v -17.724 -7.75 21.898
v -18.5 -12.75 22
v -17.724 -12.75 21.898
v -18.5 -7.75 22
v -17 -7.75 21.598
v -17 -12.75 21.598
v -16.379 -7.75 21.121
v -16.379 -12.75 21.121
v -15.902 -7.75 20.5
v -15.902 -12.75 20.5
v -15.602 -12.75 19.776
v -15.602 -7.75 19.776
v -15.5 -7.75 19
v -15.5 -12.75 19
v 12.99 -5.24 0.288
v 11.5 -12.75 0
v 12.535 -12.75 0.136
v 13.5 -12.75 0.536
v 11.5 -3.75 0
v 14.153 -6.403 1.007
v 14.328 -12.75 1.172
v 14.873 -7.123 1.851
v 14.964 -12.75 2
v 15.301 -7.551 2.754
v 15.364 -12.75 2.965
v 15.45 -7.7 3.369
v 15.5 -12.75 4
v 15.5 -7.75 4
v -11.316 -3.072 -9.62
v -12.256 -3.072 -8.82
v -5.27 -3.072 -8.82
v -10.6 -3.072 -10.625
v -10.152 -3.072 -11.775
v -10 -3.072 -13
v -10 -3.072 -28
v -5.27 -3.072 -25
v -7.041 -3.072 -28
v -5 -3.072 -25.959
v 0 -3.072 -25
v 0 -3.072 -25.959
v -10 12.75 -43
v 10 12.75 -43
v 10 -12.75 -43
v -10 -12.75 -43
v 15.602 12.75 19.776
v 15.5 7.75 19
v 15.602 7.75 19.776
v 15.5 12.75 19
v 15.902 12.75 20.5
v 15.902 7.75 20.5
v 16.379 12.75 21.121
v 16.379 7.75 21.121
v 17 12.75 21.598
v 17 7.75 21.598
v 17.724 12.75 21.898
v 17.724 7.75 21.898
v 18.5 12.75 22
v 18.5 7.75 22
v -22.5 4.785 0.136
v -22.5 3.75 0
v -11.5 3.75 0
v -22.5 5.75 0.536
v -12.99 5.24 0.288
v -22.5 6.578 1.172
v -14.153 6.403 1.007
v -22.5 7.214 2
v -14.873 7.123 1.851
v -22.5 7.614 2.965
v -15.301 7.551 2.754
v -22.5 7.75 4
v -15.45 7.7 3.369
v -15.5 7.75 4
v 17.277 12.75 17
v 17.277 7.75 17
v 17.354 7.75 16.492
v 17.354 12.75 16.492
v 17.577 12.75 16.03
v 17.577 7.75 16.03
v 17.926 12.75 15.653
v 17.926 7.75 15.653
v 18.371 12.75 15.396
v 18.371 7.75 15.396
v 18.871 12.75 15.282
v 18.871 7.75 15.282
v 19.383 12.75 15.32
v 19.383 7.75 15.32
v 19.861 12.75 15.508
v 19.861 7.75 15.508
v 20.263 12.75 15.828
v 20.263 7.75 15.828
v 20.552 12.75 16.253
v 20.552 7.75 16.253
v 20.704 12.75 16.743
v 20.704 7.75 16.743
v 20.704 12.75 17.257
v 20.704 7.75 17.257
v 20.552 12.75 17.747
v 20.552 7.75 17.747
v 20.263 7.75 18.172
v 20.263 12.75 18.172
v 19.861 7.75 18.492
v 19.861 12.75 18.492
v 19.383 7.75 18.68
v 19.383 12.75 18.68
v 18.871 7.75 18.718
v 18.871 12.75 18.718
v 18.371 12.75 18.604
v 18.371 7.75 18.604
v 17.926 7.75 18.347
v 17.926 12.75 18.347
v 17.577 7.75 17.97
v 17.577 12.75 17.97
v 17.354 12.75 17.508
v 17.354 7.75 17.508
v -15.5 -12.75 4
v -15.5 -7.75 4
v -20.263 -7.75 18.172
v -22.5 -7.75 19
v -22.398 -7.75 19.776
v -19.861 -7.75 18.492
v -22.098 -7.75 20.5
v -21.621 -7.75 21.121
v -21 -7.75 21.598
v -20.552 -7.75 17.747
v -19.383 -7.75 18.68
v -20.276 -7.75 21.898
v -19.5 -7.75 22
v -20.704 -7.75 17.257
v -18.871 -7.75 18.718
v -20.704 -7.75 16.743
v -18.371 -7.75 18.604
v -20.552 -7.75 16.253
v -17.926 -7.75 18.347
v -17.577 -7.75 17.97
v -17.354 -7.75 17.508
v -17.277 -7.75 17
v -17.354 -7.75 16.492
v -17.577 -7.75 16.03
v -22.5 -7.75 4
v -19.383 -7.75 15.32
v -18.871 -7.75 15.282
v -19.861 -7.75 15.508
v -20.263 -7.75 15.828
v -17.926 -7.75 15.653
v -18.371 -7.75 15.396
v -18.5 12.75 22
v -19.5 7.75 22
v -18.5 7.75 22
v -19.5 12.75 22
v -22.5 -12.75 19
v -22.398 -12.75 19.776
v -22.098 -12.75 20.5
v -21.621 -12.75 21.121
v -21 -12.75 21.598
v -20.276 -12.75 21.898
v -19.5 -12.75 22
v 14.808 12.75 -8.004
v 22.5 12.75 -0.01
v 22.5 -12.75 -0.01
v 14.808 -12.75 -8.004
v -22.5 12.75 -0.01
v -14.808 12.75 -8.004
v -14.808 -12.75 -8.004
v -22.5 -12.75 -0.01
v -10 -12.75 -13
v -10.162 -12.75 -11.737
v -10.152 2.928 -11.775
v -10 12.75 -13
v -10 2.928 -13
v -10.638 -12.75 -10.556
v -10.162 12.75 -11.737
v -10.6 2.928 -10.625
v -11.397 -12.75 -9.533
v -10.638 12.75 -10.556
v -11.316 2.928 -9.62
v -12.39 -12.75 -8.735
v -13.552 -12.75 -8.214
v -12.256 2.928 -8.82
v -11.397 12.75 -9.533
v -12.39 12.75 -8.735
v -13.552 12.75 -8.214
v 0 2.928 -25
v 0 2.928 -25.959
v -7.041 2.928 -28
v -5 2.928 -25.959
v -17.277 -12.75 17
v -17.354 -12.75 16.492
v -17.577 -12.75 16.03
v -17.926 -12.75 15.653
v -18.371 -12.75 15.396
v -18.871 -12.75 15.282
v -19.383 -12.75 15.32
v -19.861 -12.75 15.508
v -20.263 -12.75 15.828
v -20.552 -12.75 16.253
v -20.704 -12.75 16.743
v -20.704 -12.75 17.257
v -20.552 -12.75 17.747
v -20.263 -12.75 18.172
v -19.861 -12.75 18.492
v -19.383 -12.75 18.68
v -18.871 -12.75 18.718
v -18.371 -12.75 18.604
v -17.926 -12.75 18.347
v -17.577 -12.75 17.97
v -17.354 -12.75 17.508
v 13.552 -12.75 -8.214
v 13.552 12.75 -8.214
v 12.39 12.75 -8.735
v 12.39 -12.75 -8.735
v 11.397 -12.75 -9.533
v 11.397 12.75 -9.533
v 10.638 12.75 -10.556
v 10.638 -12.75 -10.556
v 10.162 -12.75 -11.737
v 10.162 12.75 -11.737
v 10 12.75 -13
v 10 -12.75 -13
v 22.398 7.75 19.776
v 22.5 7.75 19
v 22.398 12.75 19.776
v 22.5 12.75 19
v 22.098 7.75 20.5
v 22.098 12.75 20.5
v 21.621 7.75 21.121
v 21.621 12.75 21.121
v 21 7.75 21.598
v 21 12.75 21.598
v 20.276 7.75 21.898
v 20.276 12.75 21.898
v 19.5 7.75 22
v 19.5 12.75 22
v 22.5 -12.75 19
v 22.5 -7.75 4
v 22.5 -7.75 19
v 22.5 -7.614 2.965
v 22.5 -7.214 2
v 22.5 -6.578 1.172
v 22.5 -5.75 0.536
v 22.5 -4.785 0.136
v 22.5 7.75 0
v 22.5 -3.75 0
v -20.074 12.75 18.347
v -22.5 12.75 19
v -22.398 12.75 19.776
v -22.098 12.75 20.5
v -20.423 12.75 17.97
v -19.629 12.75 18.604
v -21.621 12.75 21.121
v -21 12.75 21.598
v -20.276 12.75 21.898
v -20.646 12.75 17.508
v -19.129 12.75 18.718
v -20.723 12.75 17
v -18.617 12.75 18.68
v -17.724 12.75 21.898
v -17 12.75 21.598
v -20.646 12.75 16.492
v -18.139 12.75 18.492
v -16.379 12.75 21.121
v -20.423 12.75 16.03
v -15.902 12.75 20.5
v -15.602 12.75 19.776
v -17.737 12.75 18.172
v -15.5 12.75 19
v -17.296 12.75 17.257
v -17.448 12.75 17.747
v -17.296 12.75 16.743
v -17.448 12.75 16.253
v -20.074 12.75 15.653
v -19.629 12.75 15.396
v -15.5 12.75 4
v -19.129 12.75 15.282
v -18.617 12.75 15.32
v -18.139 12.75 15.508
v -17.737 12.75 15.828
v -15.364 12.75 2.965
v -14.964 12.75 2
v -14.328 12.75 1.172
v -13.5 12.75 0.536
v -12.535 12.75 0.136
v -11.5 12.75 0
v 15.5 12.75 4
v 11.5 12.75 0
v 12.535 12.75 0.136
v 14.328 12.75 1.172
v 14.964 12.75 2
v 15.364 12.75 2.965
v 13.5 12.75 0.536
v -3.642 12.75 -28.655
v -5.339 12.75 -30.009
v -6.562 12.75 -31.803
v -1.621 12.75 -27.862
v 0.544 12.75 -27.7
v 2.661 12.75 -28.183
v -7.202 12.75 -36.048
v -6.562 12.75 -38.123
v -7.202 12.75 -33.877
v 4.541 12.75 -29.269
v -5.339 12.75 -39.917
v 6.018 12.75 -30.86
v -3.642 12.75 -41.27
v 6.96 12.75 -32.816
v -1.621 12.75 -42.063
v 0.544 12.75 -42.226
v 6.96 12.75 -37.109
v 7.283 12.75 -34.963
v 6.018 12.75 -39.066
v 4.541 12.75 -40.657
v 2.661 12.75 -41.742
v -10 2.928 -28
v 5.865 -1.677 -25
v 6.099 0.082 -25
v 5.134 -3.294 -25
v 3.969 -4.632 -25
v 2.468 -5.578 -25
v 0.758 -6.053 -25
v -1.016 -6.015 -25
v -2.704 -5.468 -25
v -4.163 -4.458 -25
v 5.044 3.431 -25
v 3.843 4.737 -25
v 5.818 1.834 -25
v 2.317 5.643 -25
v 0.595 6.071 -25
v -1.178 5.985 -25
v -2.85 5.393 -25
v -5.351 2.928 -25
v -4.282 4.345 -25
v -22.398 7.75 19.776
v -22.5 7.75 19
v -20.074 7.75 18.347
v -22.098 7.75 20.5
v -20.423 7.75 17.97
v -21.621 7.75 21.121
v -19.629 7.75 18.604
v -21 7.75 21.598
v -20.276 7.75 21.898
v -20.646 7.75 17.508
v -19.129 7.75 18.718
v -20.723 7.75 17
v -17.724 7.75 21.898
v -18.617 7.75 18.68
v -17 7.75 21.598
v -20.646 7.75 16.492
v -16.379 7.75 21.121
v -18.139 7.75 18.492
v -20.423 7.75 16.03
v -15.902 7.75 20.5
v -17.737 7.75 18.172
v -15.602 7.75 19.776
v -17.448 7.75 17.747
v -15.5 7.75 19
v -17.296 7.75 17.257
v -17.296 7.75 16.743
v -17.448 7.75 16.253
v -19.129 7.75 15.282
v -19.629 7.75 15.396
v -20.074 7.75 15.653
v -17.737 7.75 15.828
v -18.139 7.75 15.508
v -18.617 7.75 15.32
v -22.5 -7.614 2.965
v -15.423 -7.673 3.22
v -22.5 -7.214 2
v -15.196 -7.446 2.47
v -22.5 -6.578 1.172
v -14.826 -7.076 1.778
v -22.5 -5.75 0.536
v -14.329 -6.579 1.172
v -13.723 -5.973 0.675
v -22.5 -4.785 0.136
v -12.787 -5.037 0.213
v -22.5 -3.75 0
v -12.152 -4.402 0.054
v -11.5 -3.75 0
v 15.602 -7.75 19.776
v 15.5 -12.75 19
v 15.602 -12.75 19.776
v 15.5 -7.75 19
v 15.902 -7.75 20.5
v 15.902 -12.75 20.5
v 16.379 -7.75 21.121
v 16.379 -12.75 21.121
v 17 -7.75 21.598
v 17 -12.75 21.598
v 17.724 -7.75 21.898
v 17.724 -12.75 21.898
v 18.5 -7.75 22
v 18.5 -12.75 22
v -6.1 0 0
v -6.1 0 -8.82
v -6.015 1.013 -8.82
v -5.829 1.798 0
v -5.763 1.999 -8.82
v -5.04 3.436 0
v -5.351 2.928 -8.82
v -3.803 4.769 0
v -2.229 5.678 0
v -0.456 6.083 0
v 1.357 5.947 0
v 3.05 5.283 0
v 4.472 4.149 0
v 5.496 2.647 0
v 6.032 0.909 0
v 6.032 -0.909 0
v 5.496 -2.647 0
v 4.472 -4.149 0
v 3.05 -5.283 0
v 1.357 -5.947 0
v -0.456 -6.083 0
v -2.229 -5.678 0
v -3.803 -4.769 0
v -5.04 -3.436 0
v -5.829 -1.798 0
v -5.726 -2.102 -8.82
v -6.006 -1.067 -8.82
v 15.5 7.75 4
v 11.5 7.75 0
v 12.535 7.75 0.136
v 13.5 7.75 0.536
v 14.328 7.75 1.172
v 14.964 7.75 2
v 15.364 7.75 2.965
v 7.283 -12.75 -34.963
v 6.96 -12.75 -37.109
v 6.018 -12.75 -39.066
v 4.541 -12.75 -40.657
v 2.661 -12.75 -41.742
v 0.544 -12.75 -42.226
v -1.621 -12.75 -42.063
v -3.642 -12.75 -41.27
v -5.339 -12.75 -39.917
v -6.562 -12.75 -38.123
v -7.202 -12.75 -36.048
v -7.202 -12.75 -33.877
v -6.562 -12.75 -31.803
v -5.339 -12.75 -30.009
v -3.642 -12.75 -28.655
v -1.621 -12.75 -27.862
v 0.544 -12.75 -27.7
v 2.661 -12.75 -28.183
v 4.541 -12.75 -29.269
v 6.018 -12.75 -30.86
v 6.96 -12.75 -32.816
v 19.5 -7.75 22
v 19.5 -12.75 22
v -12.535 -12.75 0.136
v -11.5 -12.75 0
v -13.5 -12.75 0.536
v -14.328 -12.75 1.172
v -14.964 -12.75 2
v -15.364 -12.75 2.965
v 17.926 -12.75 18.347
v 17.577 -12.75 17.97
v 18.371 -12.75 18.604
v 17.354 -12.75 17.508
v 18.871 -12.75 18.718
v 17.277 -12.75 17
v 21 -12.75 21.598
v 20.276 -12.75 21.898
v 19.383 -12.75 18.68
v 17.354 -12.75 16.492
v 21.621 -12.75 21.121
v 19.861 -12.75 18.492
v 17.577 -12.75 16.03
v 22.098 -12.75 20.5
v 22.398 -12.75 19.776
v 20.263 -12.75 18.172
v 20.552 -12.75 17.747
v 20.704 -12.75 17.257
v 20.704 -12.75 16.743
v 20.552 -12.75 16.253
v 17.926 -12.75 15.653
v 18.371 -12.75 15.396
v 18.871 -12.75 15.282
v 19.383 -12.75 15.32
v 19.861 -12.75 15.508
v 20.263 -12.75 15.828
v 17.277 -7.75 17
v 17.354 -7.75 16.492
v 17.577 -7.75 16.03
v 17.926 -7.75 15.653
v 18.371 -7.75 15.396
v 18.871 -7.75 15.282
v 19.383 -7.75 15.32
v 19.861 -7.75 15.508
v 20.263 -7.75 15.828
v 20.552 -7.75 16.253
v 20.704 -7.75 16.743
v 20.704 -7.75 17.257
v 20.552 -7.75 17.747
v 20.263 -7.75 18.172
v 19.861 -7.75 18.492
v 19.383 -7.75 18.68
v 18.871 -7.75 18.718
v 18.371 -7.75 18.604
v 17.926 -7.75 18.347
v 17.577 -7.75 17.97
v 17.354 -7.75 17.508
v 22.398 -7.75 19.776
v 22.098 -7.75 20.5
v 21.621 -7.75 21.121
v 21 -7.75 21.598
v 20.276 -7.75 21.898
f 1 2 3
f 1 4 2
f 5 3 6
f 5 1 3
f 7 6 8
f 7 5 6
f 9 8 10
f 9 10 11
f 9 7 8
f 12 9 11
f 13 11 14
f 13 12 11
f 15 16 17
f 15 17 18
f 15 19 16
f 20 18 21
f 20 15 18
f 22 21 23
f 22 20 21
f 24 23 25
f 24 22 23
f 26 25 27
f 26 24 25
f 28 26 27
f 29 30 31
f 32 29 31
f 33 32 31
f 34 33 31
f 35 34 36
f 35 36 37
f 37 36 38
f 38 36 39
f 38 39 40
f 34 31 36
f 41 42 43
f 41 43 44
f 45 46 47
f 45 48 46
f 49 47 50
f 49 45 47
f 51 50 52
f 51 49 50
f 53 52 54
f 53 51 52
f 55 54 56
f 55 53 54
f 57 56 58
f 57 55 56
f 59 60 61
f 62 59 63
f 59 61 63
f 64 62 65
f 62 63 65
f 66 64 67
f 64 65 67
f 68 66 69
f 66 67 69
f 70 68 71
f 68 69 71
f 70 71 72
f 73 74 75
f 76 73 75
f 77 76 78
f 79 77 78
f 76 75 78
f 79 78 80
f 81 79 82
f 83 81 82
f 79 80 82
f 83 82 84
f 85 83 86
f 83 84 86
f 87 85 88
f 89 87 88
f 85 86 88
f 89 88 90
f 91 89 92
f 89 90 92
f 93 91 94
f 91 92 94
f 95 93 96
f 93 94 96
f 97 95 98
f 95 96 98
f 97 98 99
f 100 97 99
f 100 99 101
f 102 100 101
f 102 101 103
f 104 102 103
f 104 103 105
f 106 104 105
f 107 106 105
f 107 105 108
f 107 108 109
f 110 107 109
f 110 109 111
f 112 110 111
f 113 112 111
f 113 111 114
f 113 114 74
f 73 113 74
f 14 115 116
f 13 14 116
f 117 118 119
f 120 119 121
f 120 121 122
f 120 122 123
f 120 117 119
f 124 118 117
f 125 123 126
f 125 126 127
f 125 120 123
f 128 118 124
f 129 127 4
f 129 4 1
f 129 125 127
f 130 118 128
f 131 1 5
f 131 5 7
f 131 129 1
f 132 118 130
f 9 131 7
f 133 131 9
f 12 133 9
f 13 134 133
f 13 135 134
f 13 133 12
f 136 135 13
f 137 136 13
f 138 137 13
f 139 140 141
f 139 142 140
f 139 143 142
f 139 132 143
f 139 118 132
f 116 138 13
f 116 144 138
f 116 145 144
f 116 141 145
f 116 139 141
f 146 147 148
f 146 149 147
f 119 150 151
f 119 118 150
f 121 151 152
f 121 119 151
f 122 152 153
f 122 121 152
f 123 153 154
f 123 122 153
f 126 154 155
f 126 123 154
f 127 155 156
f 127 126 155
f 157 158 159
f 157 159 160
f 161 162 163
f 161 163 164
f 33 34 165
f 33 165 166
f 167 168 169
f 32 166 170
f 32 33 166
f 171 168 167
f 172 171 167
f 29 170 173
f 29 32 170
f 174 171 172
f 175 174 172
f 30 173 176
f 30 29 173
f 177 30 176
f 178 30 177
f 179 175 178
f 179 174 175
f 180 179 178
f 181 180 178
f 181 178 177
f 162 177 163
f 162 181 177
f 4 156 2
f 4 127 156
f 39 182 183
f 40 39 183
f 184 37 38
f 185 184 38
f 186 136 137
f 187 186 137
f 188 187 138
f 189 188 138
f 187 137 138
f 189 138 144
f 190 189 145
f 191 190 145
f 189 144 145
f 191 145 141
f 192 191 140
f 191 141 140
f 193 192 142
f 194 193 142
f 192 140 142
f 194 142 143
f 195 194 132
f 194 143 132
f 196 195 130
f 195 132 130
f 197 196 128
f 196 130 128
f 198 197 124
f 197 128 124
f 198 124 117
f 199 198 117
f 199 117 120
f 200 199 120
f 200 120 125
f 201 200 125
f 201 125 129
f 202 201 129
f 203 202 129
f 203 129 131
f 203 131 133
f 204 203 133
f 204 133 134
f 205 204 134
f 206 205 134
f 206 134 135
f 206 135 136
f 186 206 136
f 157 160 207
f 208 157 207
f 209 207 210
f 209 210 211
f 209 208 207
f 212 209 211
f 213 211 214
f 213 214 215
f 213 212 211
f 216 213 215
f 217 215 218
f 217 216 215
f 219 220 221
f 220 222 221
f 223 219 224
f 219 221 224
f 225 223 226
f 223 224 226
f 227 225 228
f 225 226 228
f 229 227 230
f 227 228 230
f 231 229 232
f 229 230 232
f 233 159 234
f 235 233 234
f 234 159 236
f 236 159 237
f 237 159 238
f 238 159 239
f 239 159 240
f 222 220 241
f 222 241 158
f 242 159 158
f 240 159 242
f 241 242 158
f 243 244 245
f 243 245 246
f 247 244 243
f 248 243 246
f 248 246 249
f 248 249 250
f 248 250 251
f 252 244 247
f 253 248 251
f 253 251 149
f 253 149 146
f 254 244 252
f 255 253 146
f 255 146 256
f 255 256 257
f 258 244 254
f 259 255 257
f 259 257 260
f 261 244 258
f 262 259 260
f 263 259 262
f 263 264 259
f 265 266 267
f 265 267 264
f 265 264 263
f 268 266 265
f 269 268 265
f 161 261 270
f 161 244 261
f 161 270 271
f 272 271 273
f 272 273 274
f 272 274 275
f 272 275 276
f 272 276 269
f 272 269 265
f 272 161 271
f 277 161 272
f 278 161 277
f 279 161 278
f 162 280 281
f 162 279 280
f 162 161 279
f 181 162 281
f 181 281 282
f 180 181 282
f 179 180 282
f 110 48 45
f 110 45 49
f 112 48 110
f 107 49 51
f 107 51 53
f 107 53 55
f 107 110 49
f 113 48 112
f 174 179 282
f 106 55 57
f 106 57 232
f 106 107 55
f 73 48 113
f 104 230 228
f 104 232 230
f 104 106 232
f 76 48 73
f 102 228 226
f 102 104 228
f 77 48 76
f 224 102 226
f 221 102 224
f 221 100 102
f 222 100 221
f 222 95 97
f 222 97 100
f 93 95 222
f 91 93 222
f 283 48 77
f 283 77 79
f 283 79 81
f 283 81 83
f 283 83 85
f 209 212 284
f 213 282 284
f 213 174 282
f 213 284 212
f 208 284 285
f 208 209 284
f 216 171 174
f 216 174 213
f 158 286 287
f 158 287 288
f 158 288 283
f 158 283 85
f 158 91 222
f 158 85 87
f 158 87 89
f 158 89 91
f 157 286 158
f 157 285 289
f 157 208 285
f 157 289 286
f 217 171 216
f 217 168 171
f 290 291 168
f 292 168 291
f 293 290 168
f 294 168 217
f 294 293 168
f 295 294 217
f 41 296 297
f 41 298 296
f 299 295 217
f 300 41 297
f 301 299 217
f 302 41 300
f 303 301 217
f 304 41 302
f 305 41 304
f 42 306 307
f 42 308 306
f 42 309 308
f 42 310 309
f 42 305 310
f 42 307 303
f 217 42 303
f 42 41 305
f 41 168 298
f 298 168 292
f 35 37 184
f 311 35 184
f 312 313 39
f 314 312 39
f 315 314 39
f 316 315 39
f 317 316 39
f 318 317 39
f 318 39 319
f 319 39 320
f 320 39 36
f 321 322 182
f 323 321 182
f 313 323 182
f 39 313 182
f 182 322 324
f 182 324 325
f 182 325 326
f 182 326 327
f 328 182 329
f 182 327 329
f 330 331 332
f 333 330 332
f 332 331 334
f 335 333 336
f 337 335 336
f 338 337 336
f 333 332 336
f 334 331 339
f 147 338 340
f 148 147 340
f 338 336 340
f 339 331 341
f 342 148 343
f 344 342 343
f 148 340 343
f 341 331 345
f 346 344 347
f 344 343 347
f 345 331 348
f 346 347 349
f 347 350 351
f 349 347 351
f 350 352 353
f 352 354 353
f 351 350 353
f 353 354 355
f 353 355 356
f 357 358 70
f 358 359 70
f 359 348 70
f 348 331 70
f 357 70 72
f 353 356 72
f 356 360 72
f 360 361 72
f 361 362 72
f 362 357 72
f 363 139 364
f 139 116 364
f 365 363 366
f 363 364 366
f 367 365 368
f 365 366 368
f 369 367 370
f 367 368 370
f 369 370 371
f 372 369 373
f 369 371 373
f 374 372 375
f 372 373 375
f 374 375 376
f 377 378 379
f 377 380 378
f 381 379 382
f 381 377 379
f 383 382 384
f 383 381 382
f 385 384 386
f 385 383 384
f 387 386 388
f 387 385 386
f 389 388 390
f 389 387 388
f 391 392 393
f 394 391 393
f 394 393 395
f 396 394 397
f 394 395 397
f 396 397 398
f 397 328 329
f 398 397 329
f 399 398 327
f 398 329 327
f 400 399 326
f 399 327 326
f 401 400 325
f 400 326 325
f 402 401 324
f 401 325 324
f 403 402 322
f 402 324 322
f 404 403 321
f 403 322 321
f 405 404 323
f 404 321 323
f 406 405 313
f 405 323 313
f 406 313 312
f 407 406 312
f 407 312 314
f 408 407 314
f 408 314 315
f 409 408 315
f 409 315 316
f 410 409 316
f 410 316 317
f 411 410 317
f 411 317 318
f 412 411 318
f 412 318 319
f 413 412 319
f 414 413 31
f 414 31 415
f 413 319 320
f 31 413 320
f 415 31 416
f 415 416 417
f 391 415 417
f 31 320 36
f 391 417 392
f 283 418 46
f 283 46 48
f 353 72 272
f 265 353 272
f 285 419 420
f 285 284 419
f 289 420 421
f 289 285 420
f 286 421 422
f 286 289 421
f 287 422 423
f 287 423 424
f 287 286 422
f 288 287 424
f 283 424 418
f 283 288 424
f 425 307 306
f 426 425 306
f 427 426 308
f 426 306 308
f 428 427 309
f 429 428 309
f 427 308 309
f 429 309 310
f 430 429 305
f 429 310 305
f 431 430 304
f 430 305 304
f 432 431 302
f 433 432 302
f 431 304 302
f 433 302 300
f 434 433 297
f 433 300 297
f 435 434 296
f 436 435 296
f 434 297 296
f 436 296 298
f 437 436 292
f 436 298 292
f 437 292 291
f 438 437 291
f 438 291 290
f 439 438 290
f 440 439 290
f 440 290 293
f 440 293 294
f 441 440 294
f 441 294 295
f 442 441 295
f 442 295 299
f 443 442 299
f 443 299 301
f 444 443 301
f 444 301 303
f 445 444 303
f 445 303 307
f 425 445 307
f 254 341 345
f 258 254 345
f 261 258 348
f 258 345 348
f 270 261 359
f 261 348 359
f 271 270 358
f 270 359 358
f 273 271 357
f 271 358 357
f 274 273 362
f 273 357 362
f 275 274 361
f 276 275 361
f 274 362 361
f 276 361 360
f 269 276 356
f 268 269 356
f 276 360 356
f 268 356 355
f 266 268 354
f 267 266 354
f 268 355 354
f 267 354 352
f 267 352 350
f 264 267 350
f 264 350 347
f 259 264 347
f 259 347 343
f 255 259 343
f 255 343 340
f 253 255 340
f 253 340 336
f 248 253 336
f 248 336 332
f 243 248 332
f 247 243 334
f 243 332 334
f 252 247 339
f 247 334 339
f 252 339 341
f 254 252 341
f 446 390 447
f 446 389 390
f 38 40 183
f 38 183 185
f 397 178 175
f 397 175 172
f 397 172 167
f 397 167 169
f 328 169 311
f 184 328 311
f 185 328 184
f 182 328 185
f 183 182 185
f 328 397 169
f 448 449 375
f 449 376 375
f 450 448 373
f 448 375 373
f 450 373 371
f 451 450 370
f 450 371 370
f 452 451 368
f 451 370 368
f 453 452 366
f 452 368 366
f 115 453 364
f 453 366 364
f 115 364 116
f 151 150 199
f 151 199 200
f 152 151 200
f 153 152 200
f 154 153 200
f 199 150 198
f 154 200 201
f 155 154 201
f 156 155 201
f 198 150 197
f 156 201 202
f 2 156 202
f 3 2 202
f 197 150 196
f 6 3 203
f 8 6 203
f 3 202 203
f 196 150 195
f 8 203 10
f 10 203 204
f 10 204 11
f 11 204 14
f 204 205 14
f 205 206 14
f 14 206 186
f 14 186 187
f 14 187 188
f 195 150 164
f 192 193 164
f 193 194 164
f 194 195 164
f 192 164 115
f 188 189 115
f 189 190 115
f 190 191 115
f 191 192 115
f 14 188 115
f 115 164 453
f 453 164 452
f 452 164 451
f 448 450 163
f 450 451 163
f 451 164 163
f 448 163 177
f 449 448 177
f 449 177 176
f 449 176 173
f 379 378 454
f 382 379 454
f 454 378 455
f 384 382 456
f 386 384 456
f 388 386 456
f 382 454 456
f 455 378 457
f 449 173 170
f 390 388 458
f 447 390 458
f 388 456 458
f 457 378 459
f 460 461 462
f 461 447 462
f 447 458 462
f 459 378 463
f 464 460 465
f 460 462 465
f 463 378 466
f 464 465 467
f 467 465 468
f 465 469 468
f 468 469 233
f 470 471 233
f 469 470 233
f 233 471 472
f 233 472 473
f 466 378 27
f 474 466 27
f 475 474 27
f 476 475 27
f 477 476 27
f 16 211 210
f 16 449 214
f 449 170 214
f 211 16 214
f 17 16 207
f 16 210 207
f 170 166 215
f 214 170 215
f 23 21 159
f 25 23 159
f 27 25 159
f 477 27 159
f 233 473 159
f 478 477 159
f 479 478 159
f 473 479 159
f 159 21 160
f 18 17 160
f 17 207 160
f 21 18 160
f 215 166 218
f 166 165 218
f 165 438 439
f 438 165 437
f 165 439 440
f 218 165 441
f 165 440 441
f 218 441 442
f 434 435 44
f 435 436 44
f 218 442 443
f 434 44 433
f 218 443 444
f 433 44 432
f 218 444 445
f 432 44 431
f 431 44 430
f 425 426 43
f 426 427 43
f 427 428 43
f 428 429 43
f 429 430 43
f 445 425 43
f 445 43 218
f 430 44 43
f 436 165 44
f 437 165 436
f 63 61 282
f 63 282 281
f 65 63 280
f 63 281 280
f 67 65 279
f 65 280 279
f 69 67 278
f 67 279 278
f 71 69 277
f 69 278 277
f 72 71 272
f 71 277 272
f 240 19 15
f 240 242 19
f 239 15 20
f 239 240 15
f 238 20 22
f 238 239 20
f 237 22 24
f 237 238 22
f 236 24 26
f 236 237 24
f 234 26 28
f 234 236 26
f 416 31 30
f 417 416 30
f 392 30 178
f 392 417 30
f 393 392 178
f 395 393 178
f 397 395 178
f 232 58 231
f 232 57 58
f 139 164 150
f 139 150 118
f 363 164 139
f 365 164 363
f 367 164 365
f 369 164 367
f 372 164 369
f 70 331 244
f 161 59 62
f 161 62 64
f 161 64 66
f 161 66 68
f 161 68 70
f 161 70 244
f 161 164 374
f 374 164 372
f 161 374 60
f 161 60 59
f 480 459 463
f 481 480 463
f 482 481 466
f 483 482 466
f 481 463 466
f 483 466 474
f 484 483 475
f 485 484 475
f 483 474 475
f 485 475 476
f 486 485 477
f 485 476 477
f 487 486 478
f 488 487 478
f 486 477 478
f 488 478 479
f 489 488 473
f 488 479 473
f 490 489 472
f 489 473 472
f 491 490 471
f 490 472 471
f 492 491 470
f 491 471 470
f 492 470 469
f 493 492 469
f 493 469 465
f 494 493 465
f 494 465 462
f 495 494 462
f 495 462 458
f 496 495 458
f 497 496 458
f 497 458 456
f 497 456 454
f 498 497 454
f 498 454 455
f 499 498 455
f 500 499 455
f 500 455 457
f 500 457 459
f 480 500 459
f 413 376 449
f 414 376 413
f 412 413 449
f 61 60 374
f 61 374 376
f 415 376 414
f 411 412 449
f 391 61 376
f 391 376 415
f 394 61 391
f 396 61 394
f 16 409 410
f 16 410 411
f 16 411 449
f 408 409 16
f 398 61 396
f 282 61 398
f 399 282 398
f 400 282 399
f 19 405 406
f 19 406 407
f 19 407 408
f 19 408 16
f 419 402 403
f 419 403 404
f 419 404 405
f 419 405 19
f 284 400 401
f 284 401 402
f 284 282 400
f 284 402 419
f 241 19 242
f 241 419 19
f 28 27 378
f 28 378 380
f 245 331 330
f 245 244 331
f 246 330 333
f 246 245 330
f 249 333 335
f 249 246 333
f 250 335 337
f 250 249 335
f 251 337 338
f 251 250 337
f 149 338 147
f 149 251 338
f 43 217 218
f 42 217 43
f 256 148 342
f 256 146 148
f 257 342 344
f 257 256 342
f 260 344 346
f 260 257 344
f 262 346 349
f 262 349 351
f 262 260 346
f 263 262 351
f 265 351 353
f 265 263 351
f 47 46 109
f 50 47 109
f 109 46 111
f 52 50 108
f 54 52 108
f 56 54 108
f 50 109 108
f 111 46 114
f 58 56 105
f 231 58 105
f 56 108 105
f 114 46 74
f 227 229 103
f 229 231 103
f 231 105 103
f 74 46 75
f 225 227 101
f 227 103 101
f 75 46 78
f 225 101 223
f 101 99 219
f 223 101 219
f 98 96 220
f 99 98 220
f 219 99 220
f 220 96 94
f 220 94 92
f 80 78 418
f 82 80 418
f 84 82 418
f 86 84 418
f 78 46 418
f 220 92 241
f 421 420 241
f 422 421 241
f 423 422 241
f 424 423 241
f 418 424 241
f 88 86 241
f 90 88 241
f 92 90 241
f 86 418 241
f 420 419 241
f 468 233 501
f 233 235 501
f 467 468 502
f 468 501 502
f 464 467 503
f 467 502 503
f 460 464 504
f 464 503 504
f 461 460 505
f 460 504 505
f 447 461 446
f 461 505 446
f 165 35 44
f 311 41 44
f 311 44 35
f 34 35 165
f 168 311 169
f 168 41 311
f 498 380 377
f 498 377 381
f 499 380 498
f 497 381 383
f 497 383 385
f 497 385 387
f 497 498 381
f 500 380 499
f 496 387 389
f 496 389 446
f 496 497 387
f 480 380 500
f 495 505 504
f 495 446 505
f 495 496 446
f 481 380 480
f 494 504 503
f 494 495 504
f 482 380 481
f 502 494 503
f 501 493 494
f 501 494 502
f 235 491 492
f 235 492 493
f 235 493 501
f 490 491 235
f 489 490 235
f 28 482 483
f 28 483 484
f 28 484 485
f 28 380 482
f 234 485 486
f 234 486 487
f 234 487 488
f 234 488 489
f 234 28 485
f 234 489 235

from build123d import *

# Parameters (mm, degrees)
BOSS_EXTRU_1_DEPTH                    = 25.5
ENL_V_MAT_EXTRU_1_REACH               = 52.178
ESQUISSE2_W                           = 19.17973925
ESQUISSE2_H                           = 6
ESQUISSE3_W                           = 5
ESQUISSE3_H                           = 2.04072335
BOSS_EXTRU_2_DEPTH                    = 6
ESQUISSE4_W                           = 7
ESQUISSE4_H                           = 5
BOSS_EXTRU_3_DEPTH                    = 22
ESQUISSE5_W                           = 7
ESQUISSE5_H                           = 5
BOSS_EXTRU_4_DEPTH                    = 22
ESQUISSE6_W                           = 7
ESQUISSE6_H                           = 5
BOSS_EXTRU_5_DEPTH                    = 22
ESQUISSE7_W                           = 7
ESQUISSE7_H                           = 5
BOSS_EXTRU_6_DEPTH                    = 22
D_POUILLE1_ANGLE                      = 45
D_GAGEMENT_M121_D                     = 14.566399692
D_GAGEMENT_M31_D                      = 3.44556842
D_GAGEMENT_M31_DEPTH                  = 5
D_GAGEMENT_M32_D                      = 3.44556842
D_GAGEMENT_M33_D                      = 3.44556842
D_GAGEMENT_M33_DEPTH                  = 25.5
DIAM_TRE_DU_PER_AGE_12_2_12_2_1_D     = 12.2
DIAM_TRE_DU_PER_AGE_12_2_12_2_1_DEPTH = 25
CONG_1_R                              = 3
CONG_2_R                              = 4


with BuildPart() as part:
    # Esquisse1 → Boss.-Extru.1 (new body)
    with BuildSketch(Plane(origin=(0, 12.75, 0), x_dir=(1, 0, 0), z_dir=(0, 1, 0))):
        with BuildLine():
            Line((-22.5, 0), (22.5, 0))
            Line((22.5, 0), (22.5, 0.009618943))
            Line((22.5, 0.009618943), (14.807692308, 8.003699594))
            ThreePointArc((14.807692308, 8.003699594), (11.397116539, 9.533123774), (10, 13))
            Line((10, 13), (10, 43))
            Line((10, 43), (-10, 43))
            Line((-10, 43), (-10, 13))
            ThreePointArc((-10, 13), (-11.397116539, 9.533123774), (-14.807692308, 8.003699594))
            Line((-14.807692308, 8.003699594), (-22.5, 0.009618943))
            Line((-22.5, 0.009618943), (-22.5, 0))
        make_face()
    extrude(amount=-BOSS_EXTRU_1_DEPTH)

    # Esquisse2 → Enlèv. mat.-Extru.1 (cut, up to next)
    with BuildSketch(Plane(origin=(0, 0, 0), x_dir=(0, 0, -1), z_dir=(1, 0, 0)), mode=Mode.PRIVATE) as enl_v_mat_extru_1_sk1:
        with Locations((18.410130375, -0.071525989)):
            Rectangle(ESQUISSE2_W, ESQUISSE2_H)
    enl_v_mat_extru_1_tool1 = extrude(enl_v_mat_extru_1_sk1.sketch, amount=-ENL_V_MAT_EXTRU_1_REACH, mode=Mode.PRIVATE) & part.part
    add(enl_v_mat_extru_1_tool1.solids().sort_by_distance((0, -0.071526, -18.41013))[0], mode=Mode.SUBTRACT)

    # Esquisse3 → Boss.-Extru.2 (add)
    with BuildSketch(Plane(origin=(0, -3.071525989, 0), x_dir=(-1, 0, 0), z_dir=(0, 1, 0))):
        with Locations((2.5, -26.979638325)):
            Rectangle(ESQUISSE3_W, ESQUISSE3_H)
    extrude(amount=BOSS_EXTRU_2_DEPTH)

    # Esquisse4 → Boss.-Extru.3 (add)
    with BuildSketch(Plane.XY):
        with Locations((19, 10.25)):
            Rectangle(ESQUISSE4_W, ESQUISSE4_H)
    extrude(amount=BOSS_EXTRU_3_DEPTH)

    # Esquisse5 → Boss.-Extru.4 (add)
    with BuildSketch(Plane.XY):
        with Locations((-19, 10.25)):
            Rectangle(ESQUISSE5_W, ESQUISSE5_H)
    extrude(amount=BOSS_EXTRU_4_DEPTH)

    # Esquisse6 → Boss.-Extru.5 (add)
    with BuildSketch(Plane.XY):
        with Locations((19, -10.25)):
            Rectangle(ESQUISSE6_W, ESQUISSE6_H)
    extrude(amount=BOSS_EXTRU_5_DEPTH)

    # Esquisse7 → Boss.-Extru.6 (add)
    with BuildSketch(Plane.XY):
        with Locations((-19, -10.25)):
            Rectangle(ESQUISSE7_W, ESQUISSE7_H)
    extrude(amount=BOSS_EXTRU_6_DEPTH)

    # Dépouille1
    d_pouille1_faces = [part.faces().sort_by_distance(p)[0] for p in [
        (-5, -0.071525989, -26.979638325),
    ]]
    draft(d_pouille1_faces, Plane(origin=(0, 2.928474011, -25.95927665), x_dir=(0, 1, 0), z_dir=(0, 0, 1)), D_POUILLE1_ANGLE)

    # Dégagement M121 (through all)
    with Locations(Plane(origin=(0, -12.75, 0), x_dir=(-1, 0, 0), z_dir=(0, -1, 0))):
        with Locations((0, 34.962736357)):
            Hole(D_GAGEMENT_M121_D / 2)

    # Dégagement M31
    with Locations(Plane(origin=(0, 12.75, 0), x_dir=(1, 0, 0), z_dir=(0, 1, 0))):
        with Locations((-19, -17), (19, -17)):
            Hole(D_GAGEMENT_M31_D / 2, depth=D_GAGEMENT_M31_DEPTH)

    # Dégagement M32 (through all)
    with Locations(Plane(origin=(0, -7.75, 0), x_dir=(1, 0, 0), z_dir=(0, 1, 0))):
        with Locations((19, -17)):
            Hole(D_GAGEMENT_M32_D / 2)

    # Dégagement M33
    with Locations(Plane(origin=(0, -12.75, 0), x_dir=(-1, 0, 0), z_dir=(0, -1, 0))):
        with Locations((19, -17)):
            Hole(D_GAGEMENT_M33_D / 2, depth=D_GAGEMENT_M33_DEPTH)

    # Diamètre du perçage Ø12.2 (12.2)1
    with Locations(Plane.XY):
        with Locations((0, 0)):
            Hole(DIAM_TRE_DU_PER_AGE_12_2_12_2_1_D / 2, depth=DIAM_TRE_DU_PER_AGE_12_2_12_2_1_DEPTH)

    # Congé1
    cong_1_edges = [part.edges().sort_by_distance(p)[0] for p in [
        (15.5, -10.25, 22),
        (22.5, -10.25, 22),
        (-15.5, -10.25, 22),
        (-22.5, -10.25, 22),
        (15.5, 10.25, 22),
        (22.5, 10.25, 22),
        (-22.5, 10.25, 22),
        (-15.5, 10.25, 22),
    ]]
    fillet(cong_1_edges, radius=CONG_1_R)

    # Congé2
    cong_2_edges = [part.edges().sort_by_distance(p)[0] for p in [
        (-19, -7.75, 0),
        (-15.5, -10.25, 0),
        (15.5, 10.25, 0),
        (-19, 7.75, 0),
        (-15.5, 10.25, 0),
        (19, -7.75, 0),
        (15.5, -10.25, 0),
    ]]
    fillet(cong_2_edges, radius=CONG_2_R)


solid = part.part
